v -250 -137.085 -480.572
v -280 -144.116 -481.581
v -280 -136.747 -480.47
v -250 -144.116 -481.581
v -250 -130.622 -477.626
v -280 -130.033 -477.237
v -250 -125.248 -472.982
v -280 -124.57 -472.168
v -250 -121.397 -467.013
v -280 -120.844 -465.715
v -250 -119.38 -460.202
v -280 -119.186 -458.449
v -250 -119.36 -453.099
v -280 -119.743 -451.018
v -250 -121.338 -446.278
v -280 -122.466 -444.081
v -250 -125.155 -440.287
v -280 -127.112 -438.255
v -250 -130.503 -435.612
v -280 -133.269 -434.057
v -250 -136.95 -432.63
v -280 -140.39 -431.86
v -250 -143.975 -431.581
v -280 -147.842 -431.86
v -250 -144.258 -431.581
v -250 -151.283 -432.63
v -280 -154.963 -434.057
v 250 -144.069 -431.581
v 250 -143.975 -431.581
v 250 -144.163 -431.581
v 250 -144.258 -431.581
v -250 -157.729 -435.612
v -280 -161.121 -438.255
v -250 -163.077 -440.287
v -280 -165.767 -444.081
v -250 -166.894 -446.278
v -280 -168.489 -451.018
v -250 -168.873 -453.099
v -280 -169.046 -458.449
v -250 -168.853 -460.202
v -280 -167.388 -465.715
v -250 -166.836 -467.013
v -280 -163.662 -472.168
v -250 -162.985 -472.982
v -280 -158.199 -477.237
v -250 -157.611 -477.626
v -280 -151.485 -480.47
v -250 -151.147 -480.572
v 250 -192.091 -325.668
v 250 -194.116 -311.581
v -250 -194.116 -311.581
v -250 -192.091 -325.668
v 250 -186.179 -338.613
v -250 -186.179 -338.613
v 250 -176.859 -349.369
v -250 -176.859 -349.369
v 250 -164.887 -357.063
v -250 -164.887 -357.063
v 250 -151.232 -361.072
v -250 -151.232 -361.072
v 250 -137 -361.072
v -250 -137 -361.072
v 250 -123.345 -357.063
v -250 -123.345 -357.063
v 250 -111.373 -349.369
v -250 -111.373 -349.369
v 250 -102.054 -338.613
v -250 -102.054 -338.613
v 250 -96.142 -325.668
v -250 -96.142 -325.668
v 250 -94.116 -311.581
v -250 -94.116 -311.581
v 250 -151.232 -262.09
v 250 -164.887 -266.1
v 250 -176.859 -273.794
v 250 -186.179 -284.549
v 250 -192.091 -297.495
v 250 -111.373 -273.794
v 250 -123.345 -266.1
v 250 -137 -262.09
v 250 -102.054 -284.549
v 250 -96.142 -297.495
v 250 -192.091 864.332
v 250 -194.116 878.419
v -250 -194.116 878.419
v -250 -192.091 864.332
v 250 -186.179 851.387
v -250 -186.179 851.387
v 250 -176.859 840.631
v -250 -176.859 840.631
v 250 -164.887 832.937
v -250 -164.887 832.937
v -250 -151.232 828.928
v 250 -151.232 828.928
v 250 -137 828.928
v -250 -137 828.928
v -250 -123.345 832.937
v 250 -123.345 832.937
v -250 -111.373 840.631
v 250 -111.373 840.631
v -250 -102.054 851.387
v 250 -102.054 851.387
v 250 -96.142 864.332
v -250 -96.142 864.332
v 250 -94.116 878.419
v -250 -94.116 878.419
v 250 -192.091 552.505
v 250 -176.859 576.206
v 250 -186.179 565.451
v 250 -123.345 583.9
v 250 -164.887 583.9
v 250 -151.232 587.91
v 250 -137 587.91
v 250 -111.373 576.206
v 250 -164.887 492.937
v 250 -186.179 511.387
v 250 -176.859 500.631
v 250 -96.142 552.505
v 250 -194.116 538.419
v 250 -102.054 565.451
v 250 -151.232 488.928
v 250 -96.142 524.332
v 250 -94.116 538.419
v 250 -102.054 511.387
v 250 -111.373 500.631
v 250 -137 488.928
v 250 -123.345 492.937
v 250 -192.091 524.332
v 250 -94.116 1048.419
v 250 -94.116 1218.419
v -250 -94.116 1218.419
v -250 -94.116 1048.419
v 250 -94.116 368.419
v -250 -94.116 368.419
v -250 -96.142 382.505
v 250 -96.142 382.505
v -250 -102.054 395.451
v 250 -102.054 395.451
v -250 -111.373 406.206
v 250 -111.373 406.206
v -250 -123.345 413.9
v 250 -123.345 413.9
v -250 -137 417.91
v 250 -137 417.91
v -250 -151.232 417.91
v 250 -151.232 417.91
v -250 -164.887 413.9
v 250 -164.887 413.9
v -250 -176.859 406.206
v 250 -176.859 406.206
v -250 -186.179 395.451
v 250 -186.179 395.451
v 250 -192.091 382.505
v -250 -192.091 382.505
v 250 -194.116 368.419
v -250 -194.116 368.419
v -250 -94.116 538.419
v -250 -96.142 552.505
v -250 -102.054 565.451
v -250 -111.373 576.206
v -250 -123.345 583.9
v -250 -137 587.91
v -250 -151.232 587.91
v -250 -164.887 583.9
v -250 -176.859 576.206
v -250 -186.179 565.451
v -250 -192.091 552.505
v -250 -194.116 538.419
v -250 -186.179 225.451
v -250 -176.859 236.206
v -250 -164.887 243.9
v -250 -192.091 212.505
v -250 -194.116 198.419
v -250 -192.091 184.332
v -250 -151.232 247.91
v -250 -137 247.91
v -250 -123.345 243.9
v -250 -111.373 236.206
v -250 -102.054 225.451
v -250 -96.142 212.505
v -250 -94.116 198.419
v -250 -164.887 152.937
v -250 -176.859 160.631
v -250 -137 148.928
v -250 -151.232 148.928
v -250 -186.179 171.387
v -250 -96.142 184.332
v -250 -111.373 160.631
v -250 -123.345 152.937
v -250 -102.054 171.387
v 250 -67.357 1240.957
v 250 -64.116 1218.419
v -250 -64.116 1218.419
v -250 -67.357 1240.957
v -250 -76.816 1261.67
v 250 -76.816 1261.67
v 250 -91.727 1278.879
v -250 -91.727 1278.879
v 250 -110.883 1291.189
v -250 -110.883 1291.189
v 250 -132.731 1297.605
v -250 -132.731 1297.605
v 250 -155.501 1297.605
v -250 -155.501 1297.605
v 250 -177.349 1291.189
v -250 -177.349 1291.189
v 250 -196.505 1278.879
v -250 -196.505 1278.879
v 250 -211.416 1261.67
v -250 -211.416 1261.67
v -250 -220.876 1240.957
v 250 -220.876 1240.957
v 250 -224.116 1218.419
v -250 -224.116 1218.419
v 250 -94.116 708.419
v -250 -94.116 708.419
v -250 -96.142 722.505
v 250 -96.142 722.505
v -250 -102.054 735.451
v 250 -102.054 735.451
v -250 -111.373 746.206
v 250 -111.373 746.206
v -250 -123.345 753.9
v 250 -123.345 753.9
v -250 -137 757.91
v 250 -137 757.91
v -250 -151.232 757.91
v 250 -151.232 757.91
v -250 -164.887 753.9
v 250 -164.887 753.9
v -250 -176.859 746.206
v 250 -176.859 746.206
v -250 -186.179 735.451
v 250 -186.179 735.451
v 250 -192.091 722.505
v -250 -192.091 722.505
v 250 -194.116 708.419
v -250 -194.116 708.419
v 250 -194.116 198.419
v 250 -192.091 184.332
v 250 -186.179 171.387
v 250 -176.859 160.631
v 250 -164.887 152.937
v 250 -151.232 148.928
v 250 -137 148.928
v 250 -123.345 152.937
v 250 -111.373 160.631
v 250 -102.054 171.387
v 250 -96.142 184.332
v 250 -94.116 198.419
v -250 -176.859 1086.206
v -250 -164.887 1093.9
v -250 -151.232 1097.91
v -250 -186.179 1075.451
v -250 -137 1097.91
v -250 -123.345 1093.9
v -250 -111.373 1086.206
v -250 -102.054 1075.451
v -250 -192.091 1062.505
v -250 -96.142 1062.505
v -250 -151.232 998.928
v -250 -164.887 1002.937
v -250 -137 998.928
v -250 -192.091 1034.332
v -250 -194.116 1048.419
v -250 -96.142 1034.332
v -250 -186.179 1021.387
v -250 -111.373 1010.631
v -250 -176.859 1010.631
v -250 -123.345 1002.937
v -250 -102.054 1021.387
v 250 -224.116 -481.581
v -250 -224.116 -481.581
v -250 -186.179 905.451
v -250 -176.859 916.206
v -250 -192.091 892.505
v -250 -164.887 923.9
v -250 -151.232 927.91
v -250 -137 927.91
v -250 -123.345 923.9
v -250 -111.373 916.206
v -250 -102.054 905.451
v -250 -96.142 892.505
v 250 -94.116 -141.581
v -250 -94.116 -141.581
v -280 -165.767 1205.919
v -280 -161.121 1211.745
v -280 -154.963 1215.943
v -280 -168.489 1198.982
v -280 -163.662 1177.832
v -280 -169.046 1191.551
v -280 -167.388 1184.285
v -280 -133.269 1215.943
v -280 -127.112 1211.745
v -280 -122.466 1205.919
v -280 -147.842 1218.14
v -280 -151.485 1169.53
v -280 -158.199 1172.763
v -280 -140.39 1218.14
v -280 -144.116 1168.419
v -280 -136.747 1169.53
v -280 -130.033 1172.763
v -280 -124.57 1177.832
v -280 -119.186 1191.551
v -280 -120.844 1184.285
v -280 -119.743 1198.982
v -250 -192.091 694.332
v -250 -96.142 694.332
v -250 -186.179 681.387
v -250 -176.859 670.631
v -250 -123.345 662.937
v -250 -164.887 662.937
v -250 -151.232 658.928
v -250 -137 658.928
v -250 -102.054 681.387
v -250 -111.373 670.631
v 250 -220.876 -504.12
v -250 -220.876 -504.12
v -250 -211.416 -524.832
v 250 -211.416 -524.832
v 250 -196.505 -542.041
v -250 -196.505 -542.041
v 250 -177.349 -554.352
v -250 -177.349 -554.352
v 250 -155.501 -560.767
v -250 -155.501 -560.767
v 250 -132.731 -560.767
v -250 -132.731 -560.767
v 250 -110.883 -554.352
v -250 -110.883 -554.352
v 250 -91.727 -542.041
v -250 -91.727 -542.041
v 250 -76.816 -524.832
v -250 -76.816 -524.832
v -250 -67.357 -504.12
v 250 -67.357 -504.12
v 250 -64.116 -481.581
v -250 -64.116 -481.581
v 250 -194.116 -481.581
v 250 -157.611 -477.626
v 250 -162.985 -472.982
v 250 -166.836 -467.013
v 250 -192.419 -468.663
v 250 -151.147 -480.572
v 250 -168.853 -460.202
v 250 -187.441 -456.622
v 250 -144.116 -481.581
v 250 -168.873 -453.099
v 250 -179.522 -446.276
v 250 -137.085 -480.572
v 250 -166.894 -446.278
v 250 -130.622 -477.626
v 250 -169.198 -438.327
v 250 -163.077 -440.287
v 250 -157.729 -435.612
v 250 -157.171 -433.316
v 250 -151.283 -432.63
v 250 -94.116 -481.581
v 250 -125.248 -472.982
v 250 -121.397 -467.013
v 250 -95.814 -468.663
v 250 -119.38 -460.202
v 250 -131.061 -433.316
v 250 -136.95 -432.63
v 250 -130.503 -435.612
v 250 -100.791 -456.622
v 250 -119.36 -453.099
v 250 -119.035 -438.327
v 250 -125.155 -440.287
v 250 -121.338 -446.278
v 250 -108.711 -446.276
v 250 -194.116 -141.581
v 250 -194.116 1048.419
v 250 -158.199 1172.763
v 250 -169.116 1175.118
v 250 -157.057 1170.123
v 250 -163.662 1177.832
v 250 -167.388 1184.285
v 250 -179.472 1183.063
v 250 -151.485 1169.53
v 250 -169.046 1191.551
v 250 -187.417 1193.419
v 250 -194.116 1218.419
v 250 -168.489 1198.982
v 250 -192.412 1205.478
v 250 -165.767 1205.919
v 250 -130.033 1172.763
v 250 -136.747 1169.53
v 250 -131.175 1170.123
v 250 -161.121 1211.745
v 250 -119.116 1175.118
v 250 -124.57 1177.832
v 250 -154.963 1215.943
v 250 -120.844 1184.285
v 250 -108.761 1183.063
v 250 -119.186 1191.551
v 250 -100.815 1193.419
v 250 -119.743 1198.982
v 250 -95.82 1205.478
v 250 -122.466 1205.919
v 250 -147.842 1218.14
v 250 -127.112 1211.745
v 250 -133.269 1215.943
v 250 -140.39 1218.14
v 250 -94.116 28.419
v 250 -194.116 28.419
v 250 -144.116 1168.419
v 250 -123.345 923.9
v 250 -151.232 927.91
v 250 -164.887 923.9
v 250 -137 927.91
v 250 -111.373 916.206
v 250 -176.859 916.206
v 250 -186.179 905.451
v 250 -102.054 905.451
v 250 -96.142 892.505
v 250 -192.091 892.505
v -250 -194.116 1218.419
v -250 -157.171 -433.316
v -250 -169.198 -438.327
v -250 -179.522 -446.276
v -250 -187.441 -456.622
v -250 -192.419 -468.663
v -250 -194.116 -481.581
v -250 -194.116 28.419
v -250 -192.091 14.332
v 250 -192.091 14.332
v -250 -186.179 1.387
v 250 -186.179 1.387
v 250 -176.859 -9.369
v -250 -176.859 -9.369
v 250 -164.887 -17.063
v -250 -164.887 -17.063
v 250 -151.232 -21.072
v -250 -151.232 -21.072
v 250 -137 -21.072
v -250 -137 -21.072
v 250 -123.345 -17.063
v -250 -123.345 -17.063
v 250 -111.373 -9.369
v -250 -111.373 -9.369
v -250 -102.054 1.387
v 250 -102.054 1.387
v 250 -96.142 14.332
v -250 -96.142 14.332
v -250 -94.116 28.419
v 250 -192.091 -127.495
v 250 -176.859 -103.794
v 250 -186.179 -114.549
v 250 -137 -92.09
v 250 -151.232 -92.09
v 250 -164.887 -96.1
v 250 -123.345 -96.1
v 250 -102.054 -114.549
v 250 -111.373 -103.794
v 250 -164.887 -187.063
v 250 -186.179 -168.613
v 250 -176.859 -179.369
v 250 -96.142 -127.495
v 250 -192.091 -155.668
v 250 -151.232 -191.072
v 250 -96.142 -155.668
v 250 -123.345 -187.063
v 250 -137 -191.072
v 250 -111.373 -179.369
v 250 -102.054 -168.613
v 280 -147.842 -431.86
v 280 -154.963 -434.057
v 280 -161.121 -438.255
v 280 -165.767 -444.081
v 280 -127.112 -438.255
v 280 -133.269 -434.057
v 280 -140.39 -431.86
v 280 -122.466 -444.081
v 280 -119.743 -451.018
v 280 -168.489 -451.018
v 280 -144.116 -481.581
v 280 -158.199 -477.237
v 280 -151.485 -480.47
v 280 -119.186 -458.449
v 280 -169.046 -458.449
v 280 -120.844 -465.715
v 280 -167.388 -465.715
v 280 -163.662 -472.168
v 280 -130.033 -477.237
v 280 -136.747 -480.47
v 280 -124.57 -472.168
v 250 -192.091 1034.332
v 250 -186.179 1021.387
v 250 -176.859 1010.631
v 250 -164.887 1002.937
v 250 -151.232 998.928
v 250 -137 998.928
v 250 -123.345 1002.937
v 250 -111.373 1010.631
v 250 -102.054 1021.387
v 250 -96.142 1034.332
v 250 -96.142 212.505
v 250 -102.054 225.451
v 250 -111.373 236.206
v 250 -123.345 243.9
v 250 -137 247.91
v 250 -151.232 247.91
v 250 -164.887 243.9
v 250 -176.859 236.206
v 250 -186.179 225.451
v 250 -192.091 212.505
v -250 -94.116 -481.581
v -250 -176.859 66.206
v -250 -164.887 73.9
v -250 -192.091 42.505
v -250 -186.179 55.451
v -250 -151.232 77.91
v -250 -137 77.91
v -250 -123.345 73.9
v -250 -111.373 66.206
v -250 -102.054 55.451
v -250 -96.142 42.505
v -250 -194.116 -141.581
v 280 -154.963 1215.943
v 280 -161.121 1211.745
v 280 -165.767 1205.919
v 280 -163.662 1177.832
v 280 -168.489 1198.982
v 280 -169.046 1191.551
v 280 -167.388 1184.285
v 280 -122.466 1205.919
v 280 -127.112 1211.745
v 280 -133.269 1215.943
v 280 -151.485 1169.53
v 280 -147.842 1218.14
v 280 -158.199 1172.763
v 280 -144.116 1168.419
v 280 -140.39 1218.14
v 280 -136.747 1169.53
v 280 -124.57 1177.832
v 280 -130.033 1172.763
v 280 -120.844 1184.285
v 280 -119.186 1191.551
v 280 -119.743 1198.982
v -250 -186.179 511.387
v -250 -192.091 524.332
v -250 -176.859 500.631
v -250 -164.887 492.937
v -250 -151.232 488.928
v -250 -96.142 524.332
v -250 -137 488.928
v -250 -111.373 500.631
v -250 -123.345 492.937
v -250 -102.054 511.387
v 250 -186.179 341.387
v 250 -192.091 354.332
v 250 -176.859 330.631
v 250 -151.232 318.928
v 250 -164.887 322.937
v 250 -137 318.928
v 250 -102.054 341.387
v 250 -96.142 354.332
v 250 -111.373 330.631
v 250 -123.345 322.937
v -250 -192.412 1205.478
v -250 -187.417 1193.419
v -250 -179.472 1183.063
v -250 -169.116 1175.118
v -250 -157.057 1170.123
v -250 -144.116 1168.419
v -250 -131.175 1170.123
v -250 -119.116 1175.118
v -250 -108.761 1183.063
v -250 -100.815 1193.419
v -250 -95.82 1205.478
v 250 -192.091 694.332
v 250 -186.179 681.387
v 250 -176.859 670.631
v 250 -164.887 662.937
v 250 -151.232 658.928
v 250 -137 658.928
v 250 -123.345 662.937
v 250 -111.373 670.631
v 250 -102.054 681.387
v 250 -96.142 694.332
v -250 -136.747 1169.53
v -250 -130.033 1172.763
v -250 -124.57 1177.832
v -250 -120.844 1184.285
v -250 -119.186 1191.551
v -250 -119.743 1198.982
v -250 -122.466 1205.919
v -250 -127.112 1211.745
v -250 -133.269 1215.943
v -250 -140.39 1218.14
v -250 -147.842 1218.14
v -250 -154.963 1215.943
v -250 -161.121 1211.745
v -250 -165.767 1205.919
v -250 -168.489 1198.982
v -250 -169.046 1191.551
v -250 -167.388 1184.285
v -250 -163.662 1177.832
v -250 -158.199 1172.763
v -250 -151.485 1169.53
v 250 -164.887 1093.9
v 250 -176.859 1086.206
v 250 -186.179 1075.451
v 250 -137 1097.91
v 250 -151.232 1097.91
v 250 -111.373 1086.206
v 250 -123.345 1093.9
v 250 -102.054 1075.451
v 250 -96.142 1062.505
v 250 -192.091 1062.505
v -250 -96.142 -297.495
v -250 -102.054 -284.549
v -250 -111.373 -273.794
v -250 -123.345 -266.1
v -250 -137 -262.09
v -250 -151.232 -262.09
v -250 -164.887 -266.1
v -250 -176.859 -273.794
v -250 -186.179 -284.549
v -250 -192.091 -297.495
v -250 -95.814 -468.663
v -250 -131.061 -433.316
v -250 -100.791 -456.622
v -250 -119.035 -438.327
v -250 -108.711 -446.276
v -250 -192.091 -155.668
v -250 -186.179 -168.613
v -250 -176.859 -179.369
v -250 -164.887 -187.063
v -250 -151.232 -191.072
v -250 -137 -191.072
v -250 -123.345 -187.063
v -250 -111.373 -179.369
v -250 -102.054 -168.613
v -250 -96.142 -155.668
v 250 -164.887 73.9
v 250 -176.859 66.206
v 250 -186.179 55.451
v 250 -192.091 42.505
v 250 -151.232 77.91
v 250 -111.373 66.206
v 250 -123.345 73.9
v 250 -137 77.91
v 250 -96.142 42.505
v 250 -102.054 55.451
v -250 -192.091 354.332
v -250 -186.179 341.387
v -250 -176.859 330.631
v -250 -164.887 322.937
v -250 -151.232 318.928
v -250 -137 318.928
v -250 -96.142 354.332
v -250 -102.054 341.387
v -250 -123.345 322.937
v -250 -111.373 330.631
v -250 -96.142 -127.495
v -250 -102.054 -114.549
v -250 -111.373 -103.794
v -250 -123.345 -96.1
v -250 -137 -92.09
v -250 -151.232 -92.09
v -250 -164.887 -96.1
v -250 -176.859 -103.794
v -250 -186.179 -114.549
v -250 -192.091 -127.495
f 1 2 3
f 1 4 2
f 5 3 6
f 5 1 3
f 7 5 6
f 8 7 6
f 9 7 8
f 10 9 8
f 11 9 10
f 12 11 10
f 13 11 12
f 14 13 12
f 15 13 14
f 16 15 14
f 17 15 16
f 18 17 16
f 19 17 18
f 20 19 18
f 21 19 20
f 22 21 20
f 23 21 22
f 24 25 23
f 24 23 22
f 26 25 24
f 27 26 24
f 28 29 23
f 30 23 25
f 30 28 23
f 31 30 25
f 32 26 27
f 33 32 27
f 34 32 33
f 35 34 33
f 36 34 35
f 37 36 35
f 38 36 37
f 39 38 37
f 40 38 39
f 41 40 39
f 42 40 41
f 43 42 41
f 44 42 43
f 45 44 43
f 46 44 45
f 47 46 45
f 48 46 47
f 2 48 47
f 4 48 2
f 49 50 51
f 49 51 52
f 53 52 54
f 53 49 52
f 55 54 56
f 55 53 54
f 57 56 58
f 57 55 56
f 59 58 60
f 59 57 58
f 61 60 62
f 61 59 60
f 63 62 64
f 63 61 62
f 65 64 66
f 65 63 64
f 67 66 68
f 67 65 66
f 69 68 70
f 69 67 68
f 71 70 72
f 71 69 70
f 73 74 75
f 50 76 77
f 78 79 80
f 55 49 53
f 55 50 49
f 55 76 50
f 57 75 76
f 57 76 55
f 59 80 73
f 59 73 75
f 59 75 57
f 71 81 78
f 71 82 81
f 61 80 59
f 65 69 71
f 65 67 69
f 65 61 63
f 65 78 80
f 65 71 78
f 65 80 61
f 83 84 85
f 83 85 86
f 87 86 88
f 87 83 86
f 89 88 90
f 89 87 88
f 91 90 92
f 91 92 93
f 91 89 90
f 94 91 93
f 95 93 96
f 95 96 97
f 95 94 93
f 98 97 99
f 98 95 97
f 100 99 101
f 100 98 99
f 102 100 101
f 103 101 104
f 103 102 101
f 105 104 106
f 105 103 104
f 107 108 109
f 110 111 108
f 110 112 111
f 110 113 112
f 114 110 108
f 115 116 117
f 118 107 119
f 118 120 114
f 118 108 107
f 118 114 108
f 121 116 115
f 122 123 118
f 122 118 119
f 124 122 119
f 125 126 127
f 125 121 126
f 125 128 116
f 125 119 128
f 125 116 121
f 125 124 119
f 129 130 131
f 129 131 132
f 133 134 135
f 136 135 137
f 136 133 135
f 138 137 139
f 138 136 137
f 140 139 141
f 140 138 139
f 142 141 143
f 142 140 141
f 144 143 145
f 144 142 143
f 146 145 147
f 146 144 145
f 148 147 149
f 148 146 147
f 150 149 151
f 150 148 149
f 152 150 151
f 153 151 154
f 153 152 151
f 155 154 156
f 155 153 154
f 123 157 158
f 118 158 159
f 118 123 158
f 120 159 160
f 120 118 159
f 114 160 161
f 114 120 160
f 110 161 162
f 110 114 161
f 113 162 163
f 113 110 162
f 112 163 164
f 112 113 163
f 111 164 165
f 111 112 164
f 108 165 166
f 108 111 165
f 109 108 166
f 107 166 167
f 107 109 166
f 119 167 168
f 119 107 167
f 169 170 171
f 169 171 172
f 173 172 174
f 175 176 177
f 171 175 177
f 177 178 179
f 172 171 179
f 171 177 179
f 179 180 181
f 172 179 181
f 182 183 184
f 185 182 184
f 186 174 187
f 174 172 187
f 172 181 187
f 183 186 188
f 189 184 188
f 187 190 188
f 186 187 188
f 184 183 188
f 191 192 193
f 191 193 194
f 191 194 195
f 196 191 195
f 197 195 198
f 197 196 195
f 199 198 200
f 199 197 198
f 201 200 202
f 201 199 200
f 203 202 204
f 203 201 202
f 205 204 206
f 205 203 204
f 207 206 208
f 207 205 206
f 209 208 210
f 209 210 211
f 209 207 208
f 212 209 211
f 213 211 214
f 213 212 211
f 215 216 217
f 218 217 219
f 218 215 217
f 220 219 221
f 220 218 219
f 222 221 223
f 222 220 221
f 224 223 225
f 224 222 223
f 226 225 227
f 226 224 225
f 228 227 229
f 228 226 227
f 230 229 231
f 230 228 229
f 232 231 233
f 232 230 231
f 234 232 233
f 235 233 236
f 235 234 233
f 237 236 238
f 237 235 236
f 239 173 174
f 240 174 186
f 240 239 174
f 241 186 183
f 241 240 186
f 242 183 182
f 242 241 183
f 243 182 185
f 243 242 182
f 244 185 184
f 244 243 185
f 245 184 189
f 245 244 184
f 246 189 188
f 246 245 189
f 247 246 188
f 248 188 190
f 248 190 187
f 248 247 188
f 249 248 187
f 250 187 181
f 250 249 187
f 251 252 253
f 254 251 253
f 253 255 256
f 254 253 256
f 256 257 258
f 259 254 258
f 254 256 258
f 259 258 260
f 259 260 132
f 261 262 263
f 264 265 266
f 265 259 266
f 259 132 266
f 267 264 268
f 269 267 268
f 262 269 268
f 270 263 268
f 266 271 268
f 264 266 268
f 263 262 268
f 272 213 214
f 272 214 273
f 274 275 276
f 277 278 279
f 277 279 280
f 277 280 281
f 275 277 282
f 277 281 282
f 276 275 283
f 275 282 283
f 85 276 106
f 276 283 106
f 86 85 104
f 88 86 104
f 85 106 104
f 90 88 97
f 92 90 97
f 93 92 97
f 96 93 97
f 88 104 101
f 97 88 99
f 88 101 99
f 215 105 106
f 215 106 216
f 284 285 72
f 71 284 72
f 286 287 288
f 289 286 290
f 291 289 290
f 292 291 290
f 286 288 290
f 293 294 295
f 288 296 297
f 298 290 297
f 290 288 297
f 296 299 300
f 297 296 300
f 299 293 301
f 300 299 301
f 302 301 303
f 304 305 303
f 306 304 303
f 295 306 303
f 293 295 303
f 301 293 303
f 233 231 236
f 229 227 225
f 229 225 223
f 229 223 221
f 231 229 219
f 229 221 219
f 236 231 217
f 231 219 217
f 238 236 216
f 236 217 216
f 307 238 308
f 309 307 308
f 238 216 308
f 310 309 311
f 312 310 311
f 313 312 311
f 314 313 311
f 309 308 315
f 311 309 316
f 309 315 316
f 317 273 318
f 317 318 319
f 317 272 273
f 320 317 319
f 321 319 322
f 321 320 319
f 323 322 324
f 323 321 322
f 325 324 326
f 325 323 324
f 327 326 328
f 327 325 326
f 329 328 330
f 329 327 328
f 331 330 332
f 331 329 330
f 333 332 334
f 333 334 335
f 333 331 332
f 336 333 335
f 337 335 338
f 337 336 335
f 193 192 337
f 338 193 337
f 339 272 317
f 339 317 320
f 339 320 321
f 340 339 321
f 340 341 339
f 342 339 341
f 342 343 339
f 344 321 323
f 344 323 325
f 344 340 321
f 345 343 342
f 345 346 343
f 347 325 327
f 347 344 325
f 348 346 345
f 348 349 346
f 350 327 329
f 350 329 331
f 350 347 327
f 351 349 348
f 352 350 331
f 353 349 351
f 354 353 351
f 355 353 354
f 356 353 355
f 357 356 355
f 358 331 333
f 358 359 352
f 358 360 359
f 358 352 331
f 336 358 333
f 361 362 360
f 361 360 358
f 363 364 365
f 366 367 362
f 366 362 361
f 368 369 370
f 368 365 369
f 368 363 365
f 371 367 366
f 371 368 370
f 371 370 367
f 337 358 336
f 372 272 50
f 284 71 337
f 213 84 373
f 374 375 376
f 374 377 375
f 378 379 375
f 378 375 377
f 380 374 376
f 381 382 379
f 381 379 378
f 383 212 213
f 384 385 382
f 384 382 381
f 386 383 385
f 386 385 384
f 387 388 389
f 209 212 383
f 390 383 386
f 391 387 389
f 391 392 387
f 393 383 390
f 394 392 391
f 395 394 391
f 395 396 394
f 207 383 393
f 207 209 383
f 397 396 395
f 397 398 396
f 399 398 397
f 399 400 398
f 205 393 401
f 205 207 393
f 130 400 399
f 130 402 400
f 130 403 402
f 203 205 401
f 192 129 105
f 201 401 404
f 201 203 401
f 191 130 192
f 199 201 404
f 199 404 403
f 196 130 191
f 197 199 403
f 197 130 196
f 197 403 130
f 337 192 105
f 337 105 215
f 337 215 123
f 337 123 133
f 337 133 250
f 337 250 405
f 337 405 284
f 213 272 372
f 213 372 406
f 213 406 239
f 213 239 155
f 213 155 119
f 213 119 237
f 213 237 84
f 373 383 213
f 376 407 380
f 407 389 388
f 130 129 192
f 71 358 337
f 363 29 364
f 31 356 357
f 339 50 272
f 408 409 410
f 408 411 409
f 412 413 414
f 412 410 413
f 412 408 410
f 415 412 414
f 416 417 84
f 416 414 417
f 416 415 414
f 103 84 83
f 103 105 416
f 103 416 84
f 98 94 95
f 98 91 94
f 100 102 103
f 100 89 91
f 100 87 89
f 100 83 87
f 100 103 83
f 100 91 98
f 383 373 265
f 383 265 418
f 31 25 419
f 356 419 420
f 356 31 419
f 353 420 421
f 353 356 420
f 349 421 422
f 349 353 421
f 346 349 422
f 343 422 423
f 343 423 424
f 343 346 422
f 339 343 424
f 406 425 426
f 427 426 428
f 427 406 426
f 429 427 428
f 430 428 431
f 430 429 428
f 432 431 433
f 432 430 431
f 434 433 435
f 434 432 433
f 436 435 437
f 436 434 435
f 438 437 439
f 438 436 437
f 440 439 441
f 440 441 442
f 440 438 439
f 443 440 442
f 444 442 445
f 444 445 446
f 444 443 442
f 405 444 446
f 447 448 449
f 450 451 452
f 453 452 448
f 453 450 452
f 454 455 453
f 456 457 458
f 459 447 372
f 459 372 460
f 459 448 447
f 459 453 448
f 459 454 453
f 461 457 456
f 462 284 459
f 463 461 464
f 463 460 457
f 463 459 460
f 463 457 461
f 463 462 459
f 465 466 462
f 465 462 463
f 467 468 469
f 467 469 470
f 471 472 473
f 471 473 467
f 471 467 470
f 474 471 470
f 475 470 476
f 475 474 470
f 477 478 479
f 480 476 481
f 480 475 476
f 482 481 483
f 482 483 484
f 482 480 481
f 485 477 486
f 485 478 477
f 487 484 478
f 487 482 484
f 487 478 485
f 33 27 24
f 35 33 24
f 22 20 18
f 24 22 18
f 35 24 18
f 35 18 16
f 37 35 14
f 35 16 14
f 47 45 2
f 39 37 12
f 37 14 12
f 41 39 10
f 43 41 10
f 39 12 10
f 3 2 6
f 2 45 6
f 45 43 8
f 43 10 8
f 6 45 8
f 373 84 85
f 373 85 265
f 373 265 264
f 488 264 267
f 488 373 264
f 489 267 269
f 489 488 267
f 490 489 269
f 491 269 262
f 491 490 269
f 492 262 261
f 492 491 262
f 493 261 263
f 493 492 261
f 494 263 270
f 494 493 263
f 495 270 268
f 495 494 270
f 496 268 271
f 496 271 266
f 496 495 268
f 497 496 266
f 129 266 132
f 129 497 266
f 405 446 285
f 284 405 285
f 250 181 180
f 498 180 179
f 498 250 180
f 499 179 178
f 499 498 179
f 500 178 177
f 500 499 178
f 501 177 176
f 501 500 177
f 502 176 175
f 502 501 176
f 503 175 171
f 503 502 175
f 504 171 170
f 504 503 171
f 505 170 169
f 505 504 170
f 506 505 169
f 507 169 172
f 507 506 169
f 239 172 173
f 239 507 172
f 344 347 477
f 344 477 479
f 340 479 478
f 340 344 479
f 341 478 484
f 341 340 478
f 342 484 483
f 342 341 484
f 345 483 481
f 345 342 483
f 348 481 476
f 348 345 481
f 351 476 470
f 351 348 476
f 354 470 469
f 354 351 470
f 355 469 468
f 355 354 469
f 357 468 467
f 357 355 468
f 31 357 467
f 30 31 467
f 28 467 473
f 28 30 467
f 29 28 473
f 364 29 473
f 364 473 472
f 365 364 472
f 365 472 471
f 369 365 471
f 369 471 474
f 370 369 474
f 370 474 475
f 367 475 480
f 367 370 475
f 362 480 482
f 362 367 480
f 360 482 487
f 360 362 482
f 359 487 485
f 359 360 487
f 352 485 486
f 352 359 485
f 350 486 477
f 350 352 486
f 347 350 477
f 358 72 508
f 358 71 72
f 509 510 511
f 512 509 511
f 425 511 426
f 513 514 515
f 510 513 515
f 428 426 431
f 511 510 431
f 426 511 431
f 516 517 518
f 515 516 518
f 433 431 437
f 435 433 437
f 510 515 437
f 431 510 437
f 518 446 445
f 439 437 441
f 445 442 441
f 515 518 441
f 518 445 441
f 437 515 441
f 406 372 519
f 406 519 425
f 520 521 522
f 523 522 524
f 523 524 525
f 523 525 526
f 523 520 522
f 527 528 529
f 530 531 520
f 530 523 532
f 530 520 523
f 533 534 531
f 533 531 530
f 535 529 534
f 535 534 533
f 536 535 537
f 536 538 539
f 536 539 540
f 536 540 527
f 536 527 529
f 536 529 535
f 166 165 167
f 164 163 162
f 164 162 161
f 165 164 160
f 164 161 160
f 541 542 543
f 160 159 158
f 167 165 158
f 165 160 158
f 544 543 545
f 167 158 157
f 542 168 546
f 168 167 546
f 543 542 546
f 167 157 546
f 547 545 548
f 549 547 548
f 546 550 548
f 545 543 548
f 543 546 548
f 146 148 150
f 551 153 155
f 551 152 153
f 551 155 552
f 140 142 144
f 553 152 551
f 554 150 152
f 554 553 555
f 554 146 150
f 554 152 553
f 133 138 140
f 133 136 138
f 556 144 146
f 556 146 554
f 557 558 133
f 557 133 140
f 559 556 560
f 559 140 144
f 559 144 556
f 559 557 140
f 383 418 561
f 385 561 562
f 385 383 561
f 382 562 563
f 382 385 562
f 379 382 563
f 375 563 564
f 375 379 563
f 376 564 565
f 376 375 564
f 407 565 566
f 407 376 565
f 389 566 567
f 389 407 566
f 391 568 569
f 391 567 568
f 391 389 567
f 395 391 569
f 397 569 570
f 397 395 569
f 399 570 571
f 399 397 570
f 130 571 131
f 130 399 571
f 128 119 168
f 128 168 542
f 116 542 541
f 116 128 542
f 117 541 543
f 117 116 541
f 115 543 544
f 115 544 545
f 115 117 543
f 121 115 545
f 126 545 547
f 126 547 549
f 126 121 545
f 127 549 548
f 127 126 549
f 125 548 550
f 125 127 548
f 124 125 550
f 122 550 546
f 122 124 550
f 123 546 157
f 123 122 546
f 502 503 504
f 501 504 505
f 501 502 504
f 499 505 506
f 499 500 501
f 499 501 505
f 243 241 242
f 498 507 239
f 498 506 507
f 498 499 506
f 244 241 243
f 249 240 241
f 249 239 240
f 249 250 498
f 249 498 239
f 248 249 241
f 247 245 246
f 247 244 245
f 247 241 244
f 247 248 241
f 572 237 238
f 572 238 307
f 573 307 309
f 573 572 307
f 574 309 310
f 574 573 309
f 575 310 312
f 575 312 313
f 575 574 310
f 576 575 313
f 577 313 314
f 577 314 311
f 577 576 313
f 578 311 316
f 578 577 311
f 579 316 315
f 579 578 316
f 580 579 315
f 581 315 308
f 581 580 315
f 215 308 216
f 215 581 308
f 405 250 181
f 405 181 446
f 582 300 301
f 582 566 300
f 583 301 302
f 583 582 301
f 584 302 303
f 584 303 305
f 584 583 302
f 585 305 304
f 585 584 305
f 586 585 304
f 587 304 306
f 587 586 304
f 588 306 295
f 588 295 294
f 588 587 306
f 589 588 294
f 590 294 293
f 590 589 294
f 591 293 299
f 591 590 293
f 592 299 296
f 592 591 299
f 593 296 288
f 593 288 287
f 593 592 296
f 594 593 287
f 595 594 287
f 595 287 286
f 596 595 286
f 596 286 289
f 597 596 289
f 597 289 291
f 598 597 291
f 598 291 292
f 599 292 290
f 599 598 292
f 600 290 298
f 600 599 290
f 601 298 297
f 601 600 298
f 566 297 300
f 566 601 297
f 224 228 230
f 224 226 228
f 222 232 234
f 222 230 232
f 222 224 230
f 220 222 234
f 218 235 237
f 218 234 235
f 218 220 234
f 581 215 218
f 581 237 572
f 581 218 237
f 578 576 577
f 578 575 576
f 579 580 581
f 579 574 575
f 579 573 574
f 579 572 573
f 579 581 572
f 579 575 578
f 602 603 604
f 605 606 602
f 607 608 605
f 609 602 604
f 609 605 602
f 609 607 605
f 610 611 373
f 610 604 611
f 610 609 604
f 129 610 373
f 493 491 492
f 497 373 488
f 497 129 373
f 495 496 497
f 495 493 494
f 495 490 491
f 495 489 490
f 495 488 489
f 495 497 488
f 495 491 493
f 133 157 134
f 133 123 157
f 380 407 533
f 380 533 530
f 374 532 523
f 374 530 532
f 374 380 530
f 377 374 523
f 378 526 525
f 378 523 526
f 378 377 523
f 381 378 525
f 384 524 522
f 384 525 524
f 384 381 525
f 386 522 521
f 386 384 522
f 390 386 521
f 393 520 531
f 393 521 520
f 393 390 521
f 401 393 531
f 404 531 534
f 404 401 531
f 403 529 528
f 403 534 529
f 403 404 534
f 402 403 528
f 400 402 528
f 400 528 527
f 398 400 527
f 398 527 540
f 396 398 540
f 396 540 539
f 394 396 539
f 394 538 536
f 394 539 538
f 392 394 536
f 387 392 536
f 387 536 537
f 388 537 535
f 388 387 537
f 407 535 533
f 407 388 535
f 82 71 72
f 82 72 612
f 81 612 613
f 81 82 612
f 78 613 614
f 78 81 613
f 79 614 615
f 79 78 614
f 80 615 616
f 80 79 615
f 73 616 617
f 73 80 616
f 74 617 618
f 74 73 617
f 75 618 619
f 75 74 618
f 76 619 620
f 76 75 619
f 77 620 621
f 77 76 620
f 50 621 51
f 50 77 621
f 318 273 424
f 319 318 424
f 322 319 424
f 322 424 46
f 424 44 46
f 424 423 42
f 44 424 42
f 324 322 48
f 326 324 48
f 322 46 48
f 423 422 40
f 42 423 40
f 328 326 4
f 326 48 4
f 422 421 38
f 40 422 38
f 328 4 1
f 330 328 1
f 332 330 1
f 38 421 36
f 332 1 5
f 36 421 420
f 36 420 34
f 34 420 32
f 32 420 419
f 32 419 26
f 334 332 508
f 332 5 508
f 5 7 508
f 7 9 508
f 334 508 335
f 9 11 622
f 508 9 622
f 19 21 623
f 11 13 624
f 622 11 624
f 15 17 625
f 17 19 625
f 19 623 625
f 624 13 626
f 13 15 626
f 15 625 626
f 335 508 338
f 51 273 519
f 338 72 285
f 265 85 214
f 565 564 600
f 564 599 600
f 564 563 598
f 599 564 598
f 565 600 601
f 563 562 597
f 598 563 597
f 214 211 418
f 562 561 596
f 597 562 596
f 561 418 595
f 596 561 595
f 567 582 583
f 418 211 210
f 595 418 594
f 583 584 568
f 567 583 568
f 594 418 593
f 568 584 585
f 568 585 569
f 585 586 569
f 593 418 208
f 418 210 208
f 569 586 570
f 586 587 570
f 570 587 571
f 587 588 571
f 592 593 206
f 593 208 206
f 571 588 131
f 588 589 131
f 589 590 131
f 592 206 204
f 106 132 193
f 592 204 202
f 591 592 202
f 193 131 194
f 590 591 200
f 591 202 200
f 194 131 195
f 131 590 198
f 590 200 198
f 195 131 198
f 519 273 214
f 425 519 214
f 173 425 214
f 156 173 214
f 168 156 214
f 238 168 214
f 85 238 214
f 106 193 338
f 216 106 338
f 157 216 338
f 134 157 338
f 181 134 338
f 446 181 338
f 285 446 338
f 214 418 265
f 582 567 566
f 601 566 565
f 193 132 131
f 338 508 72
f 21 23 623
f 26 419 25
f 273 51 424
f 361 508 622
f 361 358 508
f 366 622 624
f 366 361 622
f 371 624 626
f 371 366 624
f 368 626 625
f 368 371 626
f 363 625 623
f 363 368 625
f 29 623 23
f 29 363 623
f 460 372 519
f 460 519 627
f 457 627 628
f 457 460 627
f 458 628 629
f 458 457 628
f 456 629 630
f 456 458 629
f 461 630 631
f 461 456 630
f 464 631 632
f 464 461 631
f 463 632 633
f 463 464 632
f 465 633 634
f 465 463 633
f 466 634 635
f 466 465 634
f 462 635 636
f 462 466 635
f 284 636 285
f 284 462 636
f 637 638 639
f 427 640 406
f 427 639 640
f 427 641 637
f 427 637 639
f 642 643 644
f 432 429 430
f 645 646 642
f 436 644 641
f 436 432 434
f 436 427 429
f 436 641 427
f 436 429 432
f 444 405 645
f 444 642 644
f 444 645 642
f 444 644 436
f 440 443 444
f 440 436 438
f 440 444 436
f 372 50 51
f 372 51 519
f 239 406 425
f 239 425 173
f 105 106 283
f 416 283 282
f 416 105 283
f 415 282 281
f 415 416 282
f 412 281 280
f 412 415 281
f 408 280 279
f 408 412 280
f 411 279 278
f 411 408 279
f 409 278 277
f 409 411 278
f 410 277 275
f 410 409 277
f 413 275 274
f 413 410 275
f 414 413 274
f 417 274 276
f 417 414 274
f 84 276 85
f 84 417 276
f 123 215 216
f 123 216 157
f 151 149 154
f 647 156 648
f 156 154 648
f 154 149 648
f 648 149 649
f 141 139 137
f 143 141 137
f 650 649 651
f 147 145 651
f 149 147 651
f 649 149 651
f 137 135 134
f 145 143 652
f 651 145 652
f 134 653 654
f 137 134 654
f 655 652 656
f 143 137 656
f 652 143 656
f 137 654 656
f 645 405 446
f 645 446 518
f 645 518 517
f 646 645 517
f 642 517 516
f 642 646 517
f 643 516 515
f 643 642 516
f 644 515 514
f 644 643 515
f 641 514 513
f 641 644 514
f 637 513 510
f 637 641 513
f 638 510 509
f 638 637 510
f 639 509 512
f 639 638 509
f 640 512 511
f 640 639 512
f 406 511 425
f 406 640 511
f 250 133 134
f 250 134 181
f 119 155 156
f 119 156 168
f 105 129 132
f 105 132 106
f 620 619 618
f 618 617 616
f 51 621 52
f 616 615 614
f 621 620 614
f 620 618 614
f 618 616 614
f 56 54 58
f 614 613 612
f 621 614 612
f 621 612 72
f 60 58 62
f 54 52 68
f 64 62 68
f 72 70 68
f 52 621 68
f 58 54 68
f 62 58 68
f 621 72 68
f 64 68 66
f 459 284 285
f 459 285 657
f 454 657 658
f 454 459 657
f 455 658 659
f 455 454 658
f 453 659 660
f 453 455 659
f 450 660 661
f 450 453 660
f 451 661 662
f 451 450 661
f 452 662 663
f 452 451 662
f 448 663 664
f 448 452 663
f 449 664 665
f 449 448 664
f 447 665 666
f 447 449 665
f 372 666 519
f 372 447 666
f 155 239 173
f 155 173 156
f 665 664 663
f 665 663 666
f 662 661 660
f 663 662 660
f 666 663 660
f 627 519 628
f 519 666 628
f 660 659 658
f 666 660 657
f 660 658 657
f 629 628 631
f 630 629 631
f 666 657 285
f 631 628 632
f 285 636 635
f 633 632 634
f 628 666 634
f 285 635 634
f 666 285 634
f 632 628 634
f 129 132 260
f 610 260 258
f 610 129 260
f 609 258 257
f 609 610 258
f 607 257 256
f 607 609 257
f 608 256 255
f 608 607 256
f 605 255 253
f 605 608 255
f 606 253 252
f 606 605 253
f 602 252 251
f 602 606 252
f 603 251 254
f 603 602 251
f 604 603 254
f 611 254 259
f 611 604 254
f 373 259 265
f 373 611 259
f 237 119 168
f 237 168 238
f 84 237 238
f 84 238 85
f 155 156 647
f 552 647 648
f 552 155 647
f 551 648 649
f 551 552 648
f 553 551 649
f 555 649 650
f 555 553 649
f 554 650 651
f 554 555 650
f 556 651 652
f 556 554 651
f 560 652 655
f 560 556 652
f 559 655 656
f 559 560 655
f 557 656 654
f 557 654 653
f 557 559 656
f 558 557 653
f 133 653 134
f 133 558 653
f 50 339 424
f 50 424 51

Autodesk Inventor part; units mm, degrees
ref_plane "YZ Plane" through (0, 0, 0) normal (1, 0, 0) x (0, 1, 0)
ref_plane "XZ Plane" through (0, 0, 0) normal (0, 1, 0) x (-1, 0, 0)
ref_plane "XY Plane" through (0, 0, 0) normal (0, 0, 1) x (1, 0, 0)
sketch "Sketch1" plane through (0, 0, 0) normal (1, 0, 0) x (0, 1, 0)
  arc A0 (-194.1162, -481.5812) -> (-94.1162, -481.5812) centre (-144.1162, -481.5812) ccw
  line L0 (-194.1162, -481.5812) -> (-194.1162, 1218.4188)
  line L1 (-94.1162, 1218.4188) -> (-94.1162, -481.5812)
  arc A1 (-94.1162, 1218.4188) -> (-194.1162, 1218.4188) centre (-144.1162, 1218.4188) ccw
  line L2 (-64.1162, 1218.4188) -> (-64.1162, -481.5812)
  line L3 (-224.1162, 1218.4188) -> (-224.1162, -481.5812)
  arc A2 (-64.1162, 1218.4188) -> (-224.1162, 1218.4188) centre (-144.1162, 1218.4188) ccw
  arc A3 (-224.1162, -481.5812) -> (-64.1162, -481.5812) centre (-144.1162, -481.5812) ccw
  point P0 (0, 0)
  dimension "d5" = 1700
  dimension "d6" = 30
  dimension "d7" = 30
extrude "Extrusion1" add sketch "Sketch1" along normal mid plane 500 contours L0 A1 L1 A0 | L2 A3 L3 A2
sketch "Sketch2" plane through (250, 0, 0) normal (1, 0, 0) x (0, 0, -1)
  line L0 (-1218.4188, -94.1162) -> (481.5812, -94.1162)
  line L1 (481.5812, -194.1162) -> (-1218.4188, -194.1162)
  line L2 (481.5812, -64.1162) -> (-1218.4188, -64.1162) projected
  arc A0 (-1218.4188, -94.1162) -> (-1218.4188, -194.1162) centre (-1218.4188, -144.1162) ccw
  arc A1 (481.5812, -194.1162) -> (481.5812, -94.1162) centre (481.5812, -144.1162) ccw
  point P0 (0, 0)
  dimension "d10" = 1700
  dimension "d11" = 100
  dimension "d12" = 30
extrude "Extrusion2" cut sketch "Sketch2" against normal blind 500
sketch "Sketch3" plane through (250, 0, 0) normal (1, 0, 0) x (0, 0, -1)
  circle A0 centre (-1048.4188, -144.1162) radius 50
  line L0 (-1218.4188, -94.1162) -> (481.5812, -94.1162) projected
  circle A1 centre (-878.4188, -144.1162) radius 50
  circle A2 centre (-708.4188, -144.1162) radius 50
  circle A3 centre (-538.4188, -144.1162) radius 50
  circle A4 centre (-368.4188, -144.1162) radius 50
  circle A5 centre (-198.4188, -144.1162) radius 50
  circle A6 centre (-28.4188, -144.1162) radius 50
  circle A7 centre (141.5812, -144.1162) radius 50
  circle A8 centre (311.5812, -144.1162) radius 50
  circle A9 centre (481.5812, -144.1162) radius 50
  circle A10 centre (-1218.4188, -144.1162) radius 50
  point P0 (0, 0)
  dimension "d17" = 170
  dimension "d18" = 170
  dimension "d19" = 170
  dimension "d20" = 170
  dimension "d21" = 170
  dimension "d23" = 170
  dimension "d24" = 170
  dimension "d25" = 170
  dimension "d26" = 170
  dimension "d27" = 170
  dimension "d28" = 0
sketch "Sketch4" plane through (250, 0, 0) normal (1, 0, 0) x (0, 0, -1)
  point P0 (0, 0)
sketch "Sketch5" plane through (250, 0, 0) normal (1, 0, 0) x (0, 0, -1)
  point P0 (0, 0)
extrude "Extrusion3" add sketch "Sketch3" against normal blind 500
sketch "Sketch6" plane through (250, 0, 0) normal (1, 0, 0) x (0, 0, -1)
  circle A0 centre (-1193.419, -144.1162) radius 25
  circle A1 centre (456.581, -144.1162) radius 25
  point P0 (0, 0)
  dimension "d31" = 50
  dimension "d32" = 50
extrude "Extrusion4" add sketch "Sketch6" along normal blind 30 and the other way blind 530
properties part number "conveyer belt"
